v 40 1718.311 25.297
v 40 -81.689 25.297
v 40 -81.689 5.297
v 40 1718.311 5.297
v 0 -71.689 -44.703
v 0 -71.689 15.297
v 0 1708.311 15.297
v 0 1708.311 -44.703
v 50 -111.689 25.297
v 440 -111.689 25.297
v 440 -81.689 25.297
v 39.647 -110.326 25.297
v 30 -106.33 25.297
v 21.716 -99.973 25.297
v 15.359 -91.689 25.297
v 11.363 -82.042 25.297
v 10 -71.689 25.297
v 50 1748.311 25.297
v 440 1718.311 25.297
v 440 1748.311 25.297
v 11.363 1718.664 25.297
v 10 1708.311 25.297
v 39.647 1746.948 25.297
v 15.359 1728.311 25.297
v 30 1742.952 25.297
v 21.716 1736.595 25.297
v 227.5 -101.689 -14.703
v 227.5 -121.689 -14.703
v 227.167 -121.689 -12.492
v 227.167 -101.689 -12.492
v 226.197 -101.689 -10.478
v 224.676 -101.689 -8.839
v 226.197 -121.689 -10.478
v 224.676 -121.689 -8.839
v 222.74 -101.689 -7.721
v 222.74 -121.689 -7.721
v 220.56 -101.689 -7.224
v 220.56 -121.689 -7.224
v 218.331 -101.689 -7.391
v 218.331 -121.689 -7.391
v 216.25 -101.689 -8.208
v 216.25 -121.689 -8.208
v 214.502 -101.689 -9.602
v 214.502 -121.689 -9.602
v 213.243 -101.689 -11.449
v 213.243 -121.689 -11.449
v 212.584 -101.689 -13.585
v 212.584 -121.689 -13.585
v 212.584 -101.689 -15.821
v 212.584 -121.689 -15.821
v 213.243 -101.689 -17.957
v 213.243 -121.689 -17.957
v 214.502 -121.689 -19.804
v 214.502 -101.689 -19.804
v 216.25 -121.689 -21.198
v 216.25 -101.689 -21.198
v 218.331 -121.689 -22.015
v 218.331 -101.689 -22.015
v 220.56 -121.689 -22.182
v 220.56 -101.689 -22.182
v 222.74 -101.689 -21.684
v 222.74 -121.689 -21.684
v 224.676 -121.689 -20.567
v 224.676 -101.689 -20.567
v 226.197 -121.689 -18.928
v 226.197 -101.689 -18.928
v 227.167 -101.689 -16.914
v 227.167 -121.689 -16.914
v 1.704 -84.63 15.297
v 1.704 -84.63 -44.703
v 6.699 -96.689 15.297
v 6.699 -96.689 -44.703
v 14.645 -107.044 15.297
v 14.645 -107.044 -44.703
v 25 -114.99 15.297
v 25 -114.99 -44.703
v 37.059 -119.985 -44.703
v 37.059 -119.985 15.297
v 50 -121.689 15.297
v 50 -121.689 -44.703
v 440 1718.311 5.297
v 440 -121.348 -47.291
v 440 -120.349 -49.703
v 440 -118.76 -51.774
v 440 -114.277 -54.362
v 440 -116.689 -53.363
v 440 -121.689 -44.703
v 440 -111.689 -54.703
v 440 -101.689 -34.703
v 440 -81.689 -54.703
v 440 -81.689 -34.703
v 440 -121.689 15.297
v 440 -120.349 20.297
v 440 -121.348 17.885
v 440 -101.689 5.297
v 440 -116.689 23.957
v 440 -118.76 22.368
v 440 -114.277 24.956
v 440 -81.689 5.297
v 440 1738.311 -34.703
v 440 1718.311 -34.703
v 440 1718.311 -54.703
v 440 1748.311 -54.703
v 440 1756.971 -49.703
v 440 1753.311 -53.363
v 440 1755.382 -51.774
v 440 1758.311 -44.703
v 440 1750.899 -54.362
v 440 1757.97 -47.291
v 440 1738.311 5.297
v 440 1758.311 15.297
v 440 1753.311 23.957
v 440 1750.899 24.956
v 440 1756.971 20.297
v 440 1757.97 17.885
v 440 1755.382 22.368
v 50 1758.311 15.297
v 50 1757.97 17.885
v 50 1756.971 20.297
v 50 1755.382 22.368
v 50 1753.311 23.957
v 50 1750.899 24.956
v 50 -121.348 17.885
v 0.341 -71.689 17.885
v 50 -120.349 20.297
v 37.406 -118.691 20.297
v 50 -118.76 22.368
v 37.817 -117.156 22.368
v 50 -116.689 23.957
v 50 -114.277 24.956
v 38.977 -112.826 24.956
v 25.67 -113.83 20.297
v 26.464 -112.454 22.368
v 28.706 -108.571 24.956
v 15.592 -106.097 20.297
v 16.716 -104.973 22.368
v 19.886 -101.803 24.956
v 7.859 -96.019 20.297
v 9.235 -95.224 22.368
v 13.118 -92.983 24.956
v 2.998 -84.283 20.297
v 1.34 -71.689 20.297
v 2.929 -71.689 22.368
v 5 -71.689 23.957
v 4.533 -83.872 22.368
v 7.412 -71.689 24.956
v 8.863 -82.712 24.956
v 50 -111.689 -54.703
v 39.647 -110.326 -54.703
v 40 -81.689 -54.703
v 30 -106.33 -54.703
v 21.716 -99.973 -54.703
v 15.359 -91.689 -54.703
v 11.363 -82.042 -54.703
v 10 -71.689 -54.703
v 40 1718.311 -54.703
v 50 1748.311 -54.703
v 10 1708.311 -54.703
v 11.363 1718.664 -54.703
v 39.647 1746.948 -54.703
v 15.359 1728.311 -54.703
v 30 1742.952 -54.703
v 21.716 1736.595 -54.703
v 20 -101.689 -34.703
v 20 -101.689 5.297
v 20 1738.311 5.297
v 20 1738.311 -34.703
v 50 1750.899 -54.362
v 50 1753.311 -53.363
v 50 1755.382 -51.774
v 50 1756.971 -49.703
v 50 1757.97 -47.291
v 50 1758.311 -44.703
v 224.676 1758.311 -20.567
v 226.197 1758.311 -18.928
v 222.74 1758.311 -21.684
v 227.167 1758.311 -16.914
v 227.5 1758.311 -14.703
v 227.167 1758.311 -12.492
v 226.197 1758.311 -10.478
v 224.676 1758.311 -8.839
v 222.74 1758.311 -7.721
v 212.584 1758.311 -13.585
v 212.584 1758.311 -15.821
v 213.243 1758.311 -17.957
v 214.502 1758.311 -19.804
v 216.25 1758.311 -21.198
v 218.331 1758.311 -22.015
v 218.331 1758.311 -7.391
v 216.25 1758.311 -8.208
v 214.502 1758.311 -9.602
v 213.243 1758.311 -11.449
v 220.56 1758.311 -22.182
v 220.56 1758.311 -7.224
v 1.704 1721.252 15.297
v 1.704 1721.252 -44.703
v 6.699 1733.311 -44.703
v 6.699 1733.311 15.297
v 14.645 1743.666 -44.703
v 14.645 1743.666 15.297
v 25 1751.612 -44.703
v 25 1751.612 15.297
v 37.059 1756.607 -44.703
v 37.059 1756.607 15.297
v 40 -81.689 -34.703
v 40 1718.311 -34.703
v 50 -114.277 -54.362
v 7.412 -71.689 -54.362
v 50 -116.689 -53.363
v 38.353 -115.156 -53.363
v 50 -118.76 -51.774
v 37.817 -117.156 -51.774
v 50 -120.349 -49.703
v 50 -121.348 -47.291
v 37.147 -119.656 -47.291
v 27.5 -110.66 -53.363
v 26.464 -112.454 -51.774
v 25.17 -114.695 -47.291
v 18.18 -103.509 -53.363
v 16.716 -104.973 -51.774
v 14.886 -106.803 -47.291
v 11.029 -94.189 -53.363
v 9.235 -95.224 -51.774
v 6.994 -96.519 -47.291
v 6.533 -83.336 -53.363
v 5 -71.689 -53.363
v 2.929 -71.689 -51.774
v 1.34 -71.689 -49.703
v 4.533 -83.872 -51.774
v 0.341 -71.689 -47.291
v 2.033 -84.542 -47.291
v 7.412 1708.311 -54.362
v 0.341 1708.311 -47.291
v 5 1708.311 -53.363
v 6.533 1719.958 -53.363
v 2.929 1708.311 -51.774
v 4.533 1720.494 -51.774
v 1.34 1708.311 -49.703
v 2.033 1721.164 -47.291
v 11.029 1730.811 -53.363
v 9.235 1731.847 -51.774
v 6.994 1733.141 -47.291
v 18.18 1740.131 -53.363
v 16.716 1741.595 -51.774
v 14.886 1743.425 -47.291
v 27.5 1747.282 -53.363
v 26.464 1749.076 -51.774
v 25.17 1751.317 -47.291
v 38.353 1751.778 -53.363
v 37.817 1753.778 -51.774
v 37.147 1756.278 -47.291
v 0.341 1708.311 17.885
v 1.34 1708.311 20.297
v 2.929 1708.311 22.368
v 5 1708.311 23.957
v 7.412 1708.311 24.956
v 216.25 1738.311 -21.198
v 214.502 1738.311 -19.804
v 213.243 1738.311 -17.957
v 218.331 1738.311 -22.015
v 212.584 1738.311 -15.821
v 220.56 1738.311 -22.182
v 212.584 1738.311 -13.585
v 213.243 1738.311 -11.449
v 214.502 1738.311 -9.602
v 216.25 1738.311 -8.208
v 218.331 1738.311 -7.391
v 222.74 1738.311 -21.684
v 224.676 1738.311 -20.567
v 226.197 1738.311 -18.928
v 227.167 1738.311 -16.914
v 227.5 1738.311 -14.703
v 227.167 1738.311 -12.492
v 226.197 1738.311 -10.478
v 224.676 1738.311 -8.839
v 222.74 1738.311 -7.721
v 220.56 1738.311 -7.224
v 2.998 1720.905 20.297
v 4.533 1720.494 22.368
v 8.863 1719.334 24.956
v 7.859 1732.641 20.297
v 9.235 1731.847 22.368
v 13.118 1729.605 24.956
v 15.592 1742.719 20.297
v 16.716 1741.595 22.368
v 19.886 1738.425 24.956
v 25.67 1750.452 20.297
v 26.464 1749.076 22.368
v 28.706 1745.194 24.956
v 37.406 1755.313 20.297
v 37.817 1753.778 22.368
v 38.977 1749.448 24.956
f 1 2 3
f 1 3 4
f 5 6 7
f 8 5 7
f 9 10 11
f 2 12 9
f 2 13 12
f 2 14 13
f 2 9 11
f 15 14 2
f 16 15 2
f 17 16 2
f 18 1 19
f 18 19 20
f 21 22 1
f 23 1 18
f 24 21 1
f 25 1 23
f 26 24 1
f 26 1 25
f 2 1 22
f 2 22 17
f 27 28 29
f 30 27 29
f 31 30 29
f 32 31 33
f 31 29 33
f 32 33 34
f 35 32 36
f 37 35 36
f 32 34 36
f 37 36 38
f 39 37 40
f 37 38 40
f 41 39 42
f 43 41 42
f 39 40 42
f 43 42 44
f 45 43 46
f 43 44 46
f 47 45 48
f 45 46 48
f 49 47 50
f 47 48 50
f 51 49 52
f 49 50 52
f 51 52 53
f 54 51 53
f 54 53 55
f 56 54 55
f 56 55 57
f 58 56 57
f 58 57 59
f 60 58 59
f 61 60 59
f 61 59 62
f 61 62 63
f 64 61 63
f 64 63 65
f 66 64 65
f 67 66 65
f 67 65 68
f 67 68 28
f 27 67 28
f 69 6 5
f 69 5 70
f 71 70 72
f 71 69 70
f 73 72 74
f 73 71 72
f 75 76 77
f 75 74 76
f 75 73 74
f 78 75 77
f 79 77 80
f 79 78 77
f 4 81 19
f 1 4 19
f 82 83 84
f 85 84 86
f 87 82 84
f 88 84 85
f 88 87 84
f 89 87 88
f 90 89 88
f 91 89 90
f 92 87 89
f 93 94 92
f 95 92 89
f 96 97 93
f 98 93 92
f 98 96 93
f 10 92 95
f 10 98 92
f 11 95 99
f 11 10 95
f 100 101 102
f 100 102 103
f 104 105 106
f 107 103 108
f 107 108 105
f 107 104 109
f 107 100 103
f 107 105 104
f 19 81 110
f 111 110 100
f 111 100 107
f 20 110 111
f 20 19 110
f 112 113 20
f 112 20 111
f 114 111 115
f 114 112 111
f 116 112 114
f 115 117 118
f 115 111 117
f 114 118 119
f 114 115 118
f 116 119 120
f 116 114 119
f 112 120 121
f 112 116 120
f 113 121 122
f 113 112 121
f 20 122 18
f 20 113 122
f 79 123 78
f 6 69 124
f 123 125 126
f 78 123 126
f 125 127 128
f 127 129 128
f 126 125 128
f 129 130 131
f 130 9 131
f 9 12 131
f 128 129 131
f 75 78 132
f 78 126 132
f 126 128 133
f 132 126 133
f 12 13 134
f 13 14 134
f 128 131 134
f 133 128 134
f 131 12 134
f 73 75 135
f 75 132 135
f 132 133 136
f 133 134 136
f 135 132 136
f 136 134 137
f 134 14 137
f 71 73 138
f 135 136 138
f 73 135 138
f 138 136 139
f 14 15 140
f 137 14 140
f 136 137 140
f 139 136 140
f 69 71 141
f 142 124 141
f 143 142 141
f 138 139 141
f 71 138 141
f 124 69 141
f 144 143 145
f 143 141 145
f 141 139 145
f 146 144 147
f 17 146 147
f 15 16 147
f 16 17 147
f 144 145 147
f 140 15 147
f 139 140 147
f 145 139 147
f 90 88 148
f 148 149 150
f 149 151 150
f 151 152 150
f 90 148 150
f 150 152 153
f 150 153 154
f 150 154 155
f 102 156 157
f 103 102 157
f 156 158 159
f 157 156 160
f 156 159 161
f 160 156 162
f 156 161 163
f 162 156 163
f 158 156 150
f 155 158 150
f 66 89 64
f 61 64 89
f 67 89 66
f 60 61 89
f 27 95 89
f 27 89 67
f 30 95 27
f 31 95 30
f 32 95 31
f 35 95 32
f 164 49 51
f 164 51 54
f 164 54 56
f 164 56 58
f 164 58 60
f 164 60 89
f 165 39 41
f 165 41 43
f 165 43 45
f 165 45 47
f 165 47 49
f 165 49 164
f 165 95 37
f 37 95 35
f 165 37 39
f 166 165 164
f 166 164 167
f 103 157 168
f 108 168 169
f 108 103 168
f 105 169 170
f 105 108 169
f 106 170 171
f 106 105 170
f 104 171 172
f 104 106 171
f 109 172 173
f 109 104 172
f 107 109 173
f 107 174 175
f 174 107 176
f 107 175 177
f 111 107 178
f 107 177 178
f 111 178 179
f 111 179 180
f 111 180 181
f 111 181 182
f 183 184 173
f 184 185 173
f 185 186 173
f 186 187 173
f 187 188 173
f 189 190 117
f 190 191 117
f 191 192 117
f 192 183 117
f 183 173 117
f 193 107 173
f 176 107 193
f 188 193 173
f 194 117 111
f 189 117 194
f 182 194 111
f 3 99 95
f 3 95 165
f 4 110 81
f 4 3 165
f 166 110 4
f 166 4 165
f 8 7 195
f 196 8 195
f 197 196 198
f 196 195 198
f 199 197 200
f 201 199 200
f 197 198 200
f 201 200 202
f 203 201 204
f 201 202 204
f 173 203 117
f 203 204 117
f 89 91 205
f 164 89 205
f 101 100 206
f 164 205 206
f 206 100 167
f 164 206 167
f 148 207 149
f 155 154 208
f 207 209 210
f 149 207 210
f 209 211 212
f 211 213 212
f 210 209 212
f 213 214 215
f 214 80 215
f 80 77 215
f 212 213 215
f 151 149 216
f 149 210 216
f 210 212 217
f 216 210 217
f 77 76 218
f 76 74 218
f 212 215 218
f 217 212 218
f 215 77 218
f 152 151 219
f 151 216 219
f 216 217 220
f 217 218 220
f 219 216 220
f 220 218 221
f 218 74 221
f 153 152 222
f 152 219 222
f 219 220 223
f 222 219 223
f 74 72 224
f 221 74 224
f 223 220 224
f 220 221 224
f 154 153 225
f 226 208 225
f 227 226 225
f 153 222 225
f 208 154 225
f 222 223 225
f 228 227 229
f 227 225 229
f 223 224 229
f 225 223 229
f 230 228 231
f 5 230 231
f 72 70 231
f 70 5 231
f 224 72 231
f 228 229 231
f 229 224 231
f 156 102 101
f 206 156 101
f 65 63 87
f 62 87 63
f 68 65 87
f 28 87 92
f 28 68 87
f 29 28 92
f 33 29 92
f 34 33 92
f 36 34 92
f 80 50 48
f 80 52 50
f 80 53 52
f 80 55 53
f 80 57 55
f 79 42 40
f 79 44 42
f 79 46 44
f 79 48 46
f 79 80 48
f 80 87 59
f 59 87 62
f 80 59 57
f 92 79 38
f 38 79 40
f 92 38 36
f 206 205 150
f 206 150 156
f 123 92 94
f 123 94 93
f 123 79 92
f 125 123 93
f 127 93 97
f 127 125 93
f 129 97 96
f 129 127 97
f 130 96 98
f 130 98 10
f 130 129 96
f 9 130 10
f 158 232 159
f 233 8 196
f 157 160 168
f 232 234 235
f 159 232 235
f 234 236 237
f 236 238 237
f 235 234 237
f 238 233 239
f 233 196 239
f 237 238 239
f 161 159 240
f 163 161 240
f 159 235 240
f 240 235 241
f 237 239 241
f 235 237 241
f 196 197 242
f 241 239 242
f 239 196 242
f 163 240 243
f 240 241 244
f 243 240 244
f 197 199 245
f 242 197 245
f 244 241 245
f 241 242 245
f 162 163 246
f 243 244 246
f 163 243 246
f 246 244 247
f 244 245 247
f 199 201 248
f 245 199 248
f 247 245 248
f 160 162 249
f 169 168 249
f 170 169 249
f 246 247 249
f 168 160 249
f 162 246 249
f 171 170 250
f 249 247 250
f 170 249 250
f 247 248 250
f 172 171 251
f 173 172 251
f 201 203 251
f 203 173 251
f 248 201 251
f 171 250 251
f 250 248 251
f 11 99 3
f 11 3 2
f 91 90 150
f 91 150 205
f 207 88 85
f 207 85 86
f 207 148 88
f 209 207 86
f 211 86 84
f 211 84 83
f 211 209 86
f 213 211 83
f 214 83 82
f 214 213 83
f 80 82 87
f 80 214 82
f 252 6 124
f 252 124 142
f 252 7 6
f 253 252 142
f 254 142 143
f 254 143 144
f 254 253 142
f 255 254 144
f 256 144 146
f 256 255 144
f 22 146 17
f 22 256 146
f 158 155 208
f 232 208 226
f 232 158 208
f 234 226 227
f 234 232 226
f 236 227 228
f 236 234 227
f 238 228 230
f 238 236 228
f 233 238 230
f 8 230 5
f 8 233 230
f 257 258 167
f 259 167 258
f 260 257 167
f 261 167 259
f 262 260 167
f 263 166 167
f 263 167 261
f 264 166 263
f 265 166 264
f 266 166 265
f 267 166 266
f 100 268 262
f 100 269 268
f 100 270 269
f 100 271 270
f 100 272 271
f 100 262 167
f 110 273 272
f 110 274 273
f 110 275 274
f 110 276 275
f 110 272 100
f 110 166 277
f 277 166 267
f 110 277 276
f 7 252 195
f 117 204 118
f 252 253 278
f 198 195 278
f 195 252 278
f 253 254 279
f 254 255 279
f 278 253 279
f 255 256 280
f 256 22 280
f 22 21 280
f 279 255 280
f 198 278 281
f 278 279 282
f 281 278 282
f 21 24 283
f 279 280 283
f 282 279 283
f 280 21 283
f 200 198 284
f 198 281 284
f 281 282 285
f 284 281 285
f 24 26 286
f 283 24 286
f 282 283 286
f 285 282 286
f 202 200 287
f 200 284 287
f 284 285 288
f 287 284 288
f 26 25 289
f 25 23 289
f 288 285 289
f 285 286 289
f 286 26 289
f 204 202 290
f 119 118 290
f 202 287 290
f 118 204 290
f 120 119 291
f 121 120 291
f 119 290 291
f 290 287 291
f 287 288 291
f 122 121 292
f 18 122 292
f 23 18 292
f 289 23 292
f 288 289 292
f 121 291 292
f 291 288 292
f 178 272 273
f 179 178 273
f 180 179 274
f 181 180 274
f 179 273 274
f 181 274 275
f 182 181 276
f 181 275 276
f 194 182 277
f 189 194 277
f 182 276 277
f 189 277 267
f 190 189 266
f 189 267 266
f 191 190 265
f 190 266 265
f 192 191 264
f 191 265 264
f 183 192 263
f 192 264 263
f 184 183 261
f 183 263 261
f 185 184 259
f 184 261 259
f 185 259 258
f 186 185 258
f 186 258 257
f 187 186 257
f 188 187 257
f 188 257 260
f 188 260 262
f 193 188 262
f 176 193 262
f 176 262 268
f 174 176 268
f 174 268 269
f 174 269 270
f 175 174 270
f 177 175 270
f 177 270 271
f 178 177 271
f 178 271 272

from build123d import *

# Parameters (mm, degrees)
F0_W     = 1880
F0_H     = 80
F1_DEPTH = 440
F2_W     = 1800
F2_H     = 80
F3_DEPTH = 400
F4_W     = 400
F4_H     = 40
F5_DEPTH = 20
F6_W     = 400
F6_H     = 40
F7_DEPTH = 20
F8_W     = 1840
F8_H     = 40
F9_DEPTH = 20
F11_D    = 15
F12_R    = 50
F13_R    = 50
F14_R    = 10


with BuildPart() as f1:
    # F0 (on Right) → F1 (new body)
    with BuildSketch(Plane.YZ):
        with Locations((818.311098, -14.702874)):
            Rectangle(F0_W, F0_H)
    extrude(amount=F1_DEPTH)

    # F2 (on face) → F3 (cut)
    with BuildSketch(Plane.YZ.offset(440)):
        with Locations((818.311098, -14.702874)):
            Rectangle(F2_W, F2_H)
    extrude(amount=-F3_DEPTH, mode=Mode.SUBTRACT)

    # F4 (on face) → F5 (cut)
    with BuildSketch(Plane.XZ.offset(-1718.311098)):
        with Locations((240, -14.702874)):
            Rectangle(F4_W, F4_H)
    extrude(amount=-F5_DEPTH, mode=Mode.SUBTRACT)

    # F6 (on face) → F7 (cut)
    with BuildSketch(Plane(origin=(0, -81.688902, 0), x_dir=(-1, 0, 0), z_dir=(0, 1, 0))):
        with Locations((-240, -14.702874)):
            Rectangle(F6_W, F6_H)
    extrude(amount=-F7_DEPTH, mode=Mode.SUBTRACT)

    # F8 (on face) → F9 (cut)
    with BuildSketch(Plane.YZ.offset(40)):
        with Locations((818.311098, -14.702874)):
            Rectangle(F8_W, F8_H)
    extrude(amount=-F9_DEPTH, mode=Mode.SUBTRACT)

    # F11 (through all)
    with Locations(Plane(origin=(0, 1758.311098, 0), x_dir=(-1, 0, 0), z_dir=(0, 1, 0))):
        with Locations((-220, -14.702874)):
            Hole(F11_D / 2)

    # F12
    f12_edges = [f1.edges().sort_by_distance(p)[0] for p in [
        (0, 1758.311098, -14.702874),
    ]]
    fillet(f12_edges, radius=F12_R)

    # F13
    f13_edges = [f1.edges().sort_by_distance(p)[0] for p in [
        (0, -121.688902, -14.702874),
    ]]
    fillet(f13_edges, radius=F13_R)

    # F14
    f14_edges = [f1.edges().sort_by_distance(p)[0] for p in [
        (0, 818.311098, -54.702874),
        (0, 818.311098, 25.297126),
    ]]
    fillet(f14_edges, radius=F14_R)


solid = f1.part
